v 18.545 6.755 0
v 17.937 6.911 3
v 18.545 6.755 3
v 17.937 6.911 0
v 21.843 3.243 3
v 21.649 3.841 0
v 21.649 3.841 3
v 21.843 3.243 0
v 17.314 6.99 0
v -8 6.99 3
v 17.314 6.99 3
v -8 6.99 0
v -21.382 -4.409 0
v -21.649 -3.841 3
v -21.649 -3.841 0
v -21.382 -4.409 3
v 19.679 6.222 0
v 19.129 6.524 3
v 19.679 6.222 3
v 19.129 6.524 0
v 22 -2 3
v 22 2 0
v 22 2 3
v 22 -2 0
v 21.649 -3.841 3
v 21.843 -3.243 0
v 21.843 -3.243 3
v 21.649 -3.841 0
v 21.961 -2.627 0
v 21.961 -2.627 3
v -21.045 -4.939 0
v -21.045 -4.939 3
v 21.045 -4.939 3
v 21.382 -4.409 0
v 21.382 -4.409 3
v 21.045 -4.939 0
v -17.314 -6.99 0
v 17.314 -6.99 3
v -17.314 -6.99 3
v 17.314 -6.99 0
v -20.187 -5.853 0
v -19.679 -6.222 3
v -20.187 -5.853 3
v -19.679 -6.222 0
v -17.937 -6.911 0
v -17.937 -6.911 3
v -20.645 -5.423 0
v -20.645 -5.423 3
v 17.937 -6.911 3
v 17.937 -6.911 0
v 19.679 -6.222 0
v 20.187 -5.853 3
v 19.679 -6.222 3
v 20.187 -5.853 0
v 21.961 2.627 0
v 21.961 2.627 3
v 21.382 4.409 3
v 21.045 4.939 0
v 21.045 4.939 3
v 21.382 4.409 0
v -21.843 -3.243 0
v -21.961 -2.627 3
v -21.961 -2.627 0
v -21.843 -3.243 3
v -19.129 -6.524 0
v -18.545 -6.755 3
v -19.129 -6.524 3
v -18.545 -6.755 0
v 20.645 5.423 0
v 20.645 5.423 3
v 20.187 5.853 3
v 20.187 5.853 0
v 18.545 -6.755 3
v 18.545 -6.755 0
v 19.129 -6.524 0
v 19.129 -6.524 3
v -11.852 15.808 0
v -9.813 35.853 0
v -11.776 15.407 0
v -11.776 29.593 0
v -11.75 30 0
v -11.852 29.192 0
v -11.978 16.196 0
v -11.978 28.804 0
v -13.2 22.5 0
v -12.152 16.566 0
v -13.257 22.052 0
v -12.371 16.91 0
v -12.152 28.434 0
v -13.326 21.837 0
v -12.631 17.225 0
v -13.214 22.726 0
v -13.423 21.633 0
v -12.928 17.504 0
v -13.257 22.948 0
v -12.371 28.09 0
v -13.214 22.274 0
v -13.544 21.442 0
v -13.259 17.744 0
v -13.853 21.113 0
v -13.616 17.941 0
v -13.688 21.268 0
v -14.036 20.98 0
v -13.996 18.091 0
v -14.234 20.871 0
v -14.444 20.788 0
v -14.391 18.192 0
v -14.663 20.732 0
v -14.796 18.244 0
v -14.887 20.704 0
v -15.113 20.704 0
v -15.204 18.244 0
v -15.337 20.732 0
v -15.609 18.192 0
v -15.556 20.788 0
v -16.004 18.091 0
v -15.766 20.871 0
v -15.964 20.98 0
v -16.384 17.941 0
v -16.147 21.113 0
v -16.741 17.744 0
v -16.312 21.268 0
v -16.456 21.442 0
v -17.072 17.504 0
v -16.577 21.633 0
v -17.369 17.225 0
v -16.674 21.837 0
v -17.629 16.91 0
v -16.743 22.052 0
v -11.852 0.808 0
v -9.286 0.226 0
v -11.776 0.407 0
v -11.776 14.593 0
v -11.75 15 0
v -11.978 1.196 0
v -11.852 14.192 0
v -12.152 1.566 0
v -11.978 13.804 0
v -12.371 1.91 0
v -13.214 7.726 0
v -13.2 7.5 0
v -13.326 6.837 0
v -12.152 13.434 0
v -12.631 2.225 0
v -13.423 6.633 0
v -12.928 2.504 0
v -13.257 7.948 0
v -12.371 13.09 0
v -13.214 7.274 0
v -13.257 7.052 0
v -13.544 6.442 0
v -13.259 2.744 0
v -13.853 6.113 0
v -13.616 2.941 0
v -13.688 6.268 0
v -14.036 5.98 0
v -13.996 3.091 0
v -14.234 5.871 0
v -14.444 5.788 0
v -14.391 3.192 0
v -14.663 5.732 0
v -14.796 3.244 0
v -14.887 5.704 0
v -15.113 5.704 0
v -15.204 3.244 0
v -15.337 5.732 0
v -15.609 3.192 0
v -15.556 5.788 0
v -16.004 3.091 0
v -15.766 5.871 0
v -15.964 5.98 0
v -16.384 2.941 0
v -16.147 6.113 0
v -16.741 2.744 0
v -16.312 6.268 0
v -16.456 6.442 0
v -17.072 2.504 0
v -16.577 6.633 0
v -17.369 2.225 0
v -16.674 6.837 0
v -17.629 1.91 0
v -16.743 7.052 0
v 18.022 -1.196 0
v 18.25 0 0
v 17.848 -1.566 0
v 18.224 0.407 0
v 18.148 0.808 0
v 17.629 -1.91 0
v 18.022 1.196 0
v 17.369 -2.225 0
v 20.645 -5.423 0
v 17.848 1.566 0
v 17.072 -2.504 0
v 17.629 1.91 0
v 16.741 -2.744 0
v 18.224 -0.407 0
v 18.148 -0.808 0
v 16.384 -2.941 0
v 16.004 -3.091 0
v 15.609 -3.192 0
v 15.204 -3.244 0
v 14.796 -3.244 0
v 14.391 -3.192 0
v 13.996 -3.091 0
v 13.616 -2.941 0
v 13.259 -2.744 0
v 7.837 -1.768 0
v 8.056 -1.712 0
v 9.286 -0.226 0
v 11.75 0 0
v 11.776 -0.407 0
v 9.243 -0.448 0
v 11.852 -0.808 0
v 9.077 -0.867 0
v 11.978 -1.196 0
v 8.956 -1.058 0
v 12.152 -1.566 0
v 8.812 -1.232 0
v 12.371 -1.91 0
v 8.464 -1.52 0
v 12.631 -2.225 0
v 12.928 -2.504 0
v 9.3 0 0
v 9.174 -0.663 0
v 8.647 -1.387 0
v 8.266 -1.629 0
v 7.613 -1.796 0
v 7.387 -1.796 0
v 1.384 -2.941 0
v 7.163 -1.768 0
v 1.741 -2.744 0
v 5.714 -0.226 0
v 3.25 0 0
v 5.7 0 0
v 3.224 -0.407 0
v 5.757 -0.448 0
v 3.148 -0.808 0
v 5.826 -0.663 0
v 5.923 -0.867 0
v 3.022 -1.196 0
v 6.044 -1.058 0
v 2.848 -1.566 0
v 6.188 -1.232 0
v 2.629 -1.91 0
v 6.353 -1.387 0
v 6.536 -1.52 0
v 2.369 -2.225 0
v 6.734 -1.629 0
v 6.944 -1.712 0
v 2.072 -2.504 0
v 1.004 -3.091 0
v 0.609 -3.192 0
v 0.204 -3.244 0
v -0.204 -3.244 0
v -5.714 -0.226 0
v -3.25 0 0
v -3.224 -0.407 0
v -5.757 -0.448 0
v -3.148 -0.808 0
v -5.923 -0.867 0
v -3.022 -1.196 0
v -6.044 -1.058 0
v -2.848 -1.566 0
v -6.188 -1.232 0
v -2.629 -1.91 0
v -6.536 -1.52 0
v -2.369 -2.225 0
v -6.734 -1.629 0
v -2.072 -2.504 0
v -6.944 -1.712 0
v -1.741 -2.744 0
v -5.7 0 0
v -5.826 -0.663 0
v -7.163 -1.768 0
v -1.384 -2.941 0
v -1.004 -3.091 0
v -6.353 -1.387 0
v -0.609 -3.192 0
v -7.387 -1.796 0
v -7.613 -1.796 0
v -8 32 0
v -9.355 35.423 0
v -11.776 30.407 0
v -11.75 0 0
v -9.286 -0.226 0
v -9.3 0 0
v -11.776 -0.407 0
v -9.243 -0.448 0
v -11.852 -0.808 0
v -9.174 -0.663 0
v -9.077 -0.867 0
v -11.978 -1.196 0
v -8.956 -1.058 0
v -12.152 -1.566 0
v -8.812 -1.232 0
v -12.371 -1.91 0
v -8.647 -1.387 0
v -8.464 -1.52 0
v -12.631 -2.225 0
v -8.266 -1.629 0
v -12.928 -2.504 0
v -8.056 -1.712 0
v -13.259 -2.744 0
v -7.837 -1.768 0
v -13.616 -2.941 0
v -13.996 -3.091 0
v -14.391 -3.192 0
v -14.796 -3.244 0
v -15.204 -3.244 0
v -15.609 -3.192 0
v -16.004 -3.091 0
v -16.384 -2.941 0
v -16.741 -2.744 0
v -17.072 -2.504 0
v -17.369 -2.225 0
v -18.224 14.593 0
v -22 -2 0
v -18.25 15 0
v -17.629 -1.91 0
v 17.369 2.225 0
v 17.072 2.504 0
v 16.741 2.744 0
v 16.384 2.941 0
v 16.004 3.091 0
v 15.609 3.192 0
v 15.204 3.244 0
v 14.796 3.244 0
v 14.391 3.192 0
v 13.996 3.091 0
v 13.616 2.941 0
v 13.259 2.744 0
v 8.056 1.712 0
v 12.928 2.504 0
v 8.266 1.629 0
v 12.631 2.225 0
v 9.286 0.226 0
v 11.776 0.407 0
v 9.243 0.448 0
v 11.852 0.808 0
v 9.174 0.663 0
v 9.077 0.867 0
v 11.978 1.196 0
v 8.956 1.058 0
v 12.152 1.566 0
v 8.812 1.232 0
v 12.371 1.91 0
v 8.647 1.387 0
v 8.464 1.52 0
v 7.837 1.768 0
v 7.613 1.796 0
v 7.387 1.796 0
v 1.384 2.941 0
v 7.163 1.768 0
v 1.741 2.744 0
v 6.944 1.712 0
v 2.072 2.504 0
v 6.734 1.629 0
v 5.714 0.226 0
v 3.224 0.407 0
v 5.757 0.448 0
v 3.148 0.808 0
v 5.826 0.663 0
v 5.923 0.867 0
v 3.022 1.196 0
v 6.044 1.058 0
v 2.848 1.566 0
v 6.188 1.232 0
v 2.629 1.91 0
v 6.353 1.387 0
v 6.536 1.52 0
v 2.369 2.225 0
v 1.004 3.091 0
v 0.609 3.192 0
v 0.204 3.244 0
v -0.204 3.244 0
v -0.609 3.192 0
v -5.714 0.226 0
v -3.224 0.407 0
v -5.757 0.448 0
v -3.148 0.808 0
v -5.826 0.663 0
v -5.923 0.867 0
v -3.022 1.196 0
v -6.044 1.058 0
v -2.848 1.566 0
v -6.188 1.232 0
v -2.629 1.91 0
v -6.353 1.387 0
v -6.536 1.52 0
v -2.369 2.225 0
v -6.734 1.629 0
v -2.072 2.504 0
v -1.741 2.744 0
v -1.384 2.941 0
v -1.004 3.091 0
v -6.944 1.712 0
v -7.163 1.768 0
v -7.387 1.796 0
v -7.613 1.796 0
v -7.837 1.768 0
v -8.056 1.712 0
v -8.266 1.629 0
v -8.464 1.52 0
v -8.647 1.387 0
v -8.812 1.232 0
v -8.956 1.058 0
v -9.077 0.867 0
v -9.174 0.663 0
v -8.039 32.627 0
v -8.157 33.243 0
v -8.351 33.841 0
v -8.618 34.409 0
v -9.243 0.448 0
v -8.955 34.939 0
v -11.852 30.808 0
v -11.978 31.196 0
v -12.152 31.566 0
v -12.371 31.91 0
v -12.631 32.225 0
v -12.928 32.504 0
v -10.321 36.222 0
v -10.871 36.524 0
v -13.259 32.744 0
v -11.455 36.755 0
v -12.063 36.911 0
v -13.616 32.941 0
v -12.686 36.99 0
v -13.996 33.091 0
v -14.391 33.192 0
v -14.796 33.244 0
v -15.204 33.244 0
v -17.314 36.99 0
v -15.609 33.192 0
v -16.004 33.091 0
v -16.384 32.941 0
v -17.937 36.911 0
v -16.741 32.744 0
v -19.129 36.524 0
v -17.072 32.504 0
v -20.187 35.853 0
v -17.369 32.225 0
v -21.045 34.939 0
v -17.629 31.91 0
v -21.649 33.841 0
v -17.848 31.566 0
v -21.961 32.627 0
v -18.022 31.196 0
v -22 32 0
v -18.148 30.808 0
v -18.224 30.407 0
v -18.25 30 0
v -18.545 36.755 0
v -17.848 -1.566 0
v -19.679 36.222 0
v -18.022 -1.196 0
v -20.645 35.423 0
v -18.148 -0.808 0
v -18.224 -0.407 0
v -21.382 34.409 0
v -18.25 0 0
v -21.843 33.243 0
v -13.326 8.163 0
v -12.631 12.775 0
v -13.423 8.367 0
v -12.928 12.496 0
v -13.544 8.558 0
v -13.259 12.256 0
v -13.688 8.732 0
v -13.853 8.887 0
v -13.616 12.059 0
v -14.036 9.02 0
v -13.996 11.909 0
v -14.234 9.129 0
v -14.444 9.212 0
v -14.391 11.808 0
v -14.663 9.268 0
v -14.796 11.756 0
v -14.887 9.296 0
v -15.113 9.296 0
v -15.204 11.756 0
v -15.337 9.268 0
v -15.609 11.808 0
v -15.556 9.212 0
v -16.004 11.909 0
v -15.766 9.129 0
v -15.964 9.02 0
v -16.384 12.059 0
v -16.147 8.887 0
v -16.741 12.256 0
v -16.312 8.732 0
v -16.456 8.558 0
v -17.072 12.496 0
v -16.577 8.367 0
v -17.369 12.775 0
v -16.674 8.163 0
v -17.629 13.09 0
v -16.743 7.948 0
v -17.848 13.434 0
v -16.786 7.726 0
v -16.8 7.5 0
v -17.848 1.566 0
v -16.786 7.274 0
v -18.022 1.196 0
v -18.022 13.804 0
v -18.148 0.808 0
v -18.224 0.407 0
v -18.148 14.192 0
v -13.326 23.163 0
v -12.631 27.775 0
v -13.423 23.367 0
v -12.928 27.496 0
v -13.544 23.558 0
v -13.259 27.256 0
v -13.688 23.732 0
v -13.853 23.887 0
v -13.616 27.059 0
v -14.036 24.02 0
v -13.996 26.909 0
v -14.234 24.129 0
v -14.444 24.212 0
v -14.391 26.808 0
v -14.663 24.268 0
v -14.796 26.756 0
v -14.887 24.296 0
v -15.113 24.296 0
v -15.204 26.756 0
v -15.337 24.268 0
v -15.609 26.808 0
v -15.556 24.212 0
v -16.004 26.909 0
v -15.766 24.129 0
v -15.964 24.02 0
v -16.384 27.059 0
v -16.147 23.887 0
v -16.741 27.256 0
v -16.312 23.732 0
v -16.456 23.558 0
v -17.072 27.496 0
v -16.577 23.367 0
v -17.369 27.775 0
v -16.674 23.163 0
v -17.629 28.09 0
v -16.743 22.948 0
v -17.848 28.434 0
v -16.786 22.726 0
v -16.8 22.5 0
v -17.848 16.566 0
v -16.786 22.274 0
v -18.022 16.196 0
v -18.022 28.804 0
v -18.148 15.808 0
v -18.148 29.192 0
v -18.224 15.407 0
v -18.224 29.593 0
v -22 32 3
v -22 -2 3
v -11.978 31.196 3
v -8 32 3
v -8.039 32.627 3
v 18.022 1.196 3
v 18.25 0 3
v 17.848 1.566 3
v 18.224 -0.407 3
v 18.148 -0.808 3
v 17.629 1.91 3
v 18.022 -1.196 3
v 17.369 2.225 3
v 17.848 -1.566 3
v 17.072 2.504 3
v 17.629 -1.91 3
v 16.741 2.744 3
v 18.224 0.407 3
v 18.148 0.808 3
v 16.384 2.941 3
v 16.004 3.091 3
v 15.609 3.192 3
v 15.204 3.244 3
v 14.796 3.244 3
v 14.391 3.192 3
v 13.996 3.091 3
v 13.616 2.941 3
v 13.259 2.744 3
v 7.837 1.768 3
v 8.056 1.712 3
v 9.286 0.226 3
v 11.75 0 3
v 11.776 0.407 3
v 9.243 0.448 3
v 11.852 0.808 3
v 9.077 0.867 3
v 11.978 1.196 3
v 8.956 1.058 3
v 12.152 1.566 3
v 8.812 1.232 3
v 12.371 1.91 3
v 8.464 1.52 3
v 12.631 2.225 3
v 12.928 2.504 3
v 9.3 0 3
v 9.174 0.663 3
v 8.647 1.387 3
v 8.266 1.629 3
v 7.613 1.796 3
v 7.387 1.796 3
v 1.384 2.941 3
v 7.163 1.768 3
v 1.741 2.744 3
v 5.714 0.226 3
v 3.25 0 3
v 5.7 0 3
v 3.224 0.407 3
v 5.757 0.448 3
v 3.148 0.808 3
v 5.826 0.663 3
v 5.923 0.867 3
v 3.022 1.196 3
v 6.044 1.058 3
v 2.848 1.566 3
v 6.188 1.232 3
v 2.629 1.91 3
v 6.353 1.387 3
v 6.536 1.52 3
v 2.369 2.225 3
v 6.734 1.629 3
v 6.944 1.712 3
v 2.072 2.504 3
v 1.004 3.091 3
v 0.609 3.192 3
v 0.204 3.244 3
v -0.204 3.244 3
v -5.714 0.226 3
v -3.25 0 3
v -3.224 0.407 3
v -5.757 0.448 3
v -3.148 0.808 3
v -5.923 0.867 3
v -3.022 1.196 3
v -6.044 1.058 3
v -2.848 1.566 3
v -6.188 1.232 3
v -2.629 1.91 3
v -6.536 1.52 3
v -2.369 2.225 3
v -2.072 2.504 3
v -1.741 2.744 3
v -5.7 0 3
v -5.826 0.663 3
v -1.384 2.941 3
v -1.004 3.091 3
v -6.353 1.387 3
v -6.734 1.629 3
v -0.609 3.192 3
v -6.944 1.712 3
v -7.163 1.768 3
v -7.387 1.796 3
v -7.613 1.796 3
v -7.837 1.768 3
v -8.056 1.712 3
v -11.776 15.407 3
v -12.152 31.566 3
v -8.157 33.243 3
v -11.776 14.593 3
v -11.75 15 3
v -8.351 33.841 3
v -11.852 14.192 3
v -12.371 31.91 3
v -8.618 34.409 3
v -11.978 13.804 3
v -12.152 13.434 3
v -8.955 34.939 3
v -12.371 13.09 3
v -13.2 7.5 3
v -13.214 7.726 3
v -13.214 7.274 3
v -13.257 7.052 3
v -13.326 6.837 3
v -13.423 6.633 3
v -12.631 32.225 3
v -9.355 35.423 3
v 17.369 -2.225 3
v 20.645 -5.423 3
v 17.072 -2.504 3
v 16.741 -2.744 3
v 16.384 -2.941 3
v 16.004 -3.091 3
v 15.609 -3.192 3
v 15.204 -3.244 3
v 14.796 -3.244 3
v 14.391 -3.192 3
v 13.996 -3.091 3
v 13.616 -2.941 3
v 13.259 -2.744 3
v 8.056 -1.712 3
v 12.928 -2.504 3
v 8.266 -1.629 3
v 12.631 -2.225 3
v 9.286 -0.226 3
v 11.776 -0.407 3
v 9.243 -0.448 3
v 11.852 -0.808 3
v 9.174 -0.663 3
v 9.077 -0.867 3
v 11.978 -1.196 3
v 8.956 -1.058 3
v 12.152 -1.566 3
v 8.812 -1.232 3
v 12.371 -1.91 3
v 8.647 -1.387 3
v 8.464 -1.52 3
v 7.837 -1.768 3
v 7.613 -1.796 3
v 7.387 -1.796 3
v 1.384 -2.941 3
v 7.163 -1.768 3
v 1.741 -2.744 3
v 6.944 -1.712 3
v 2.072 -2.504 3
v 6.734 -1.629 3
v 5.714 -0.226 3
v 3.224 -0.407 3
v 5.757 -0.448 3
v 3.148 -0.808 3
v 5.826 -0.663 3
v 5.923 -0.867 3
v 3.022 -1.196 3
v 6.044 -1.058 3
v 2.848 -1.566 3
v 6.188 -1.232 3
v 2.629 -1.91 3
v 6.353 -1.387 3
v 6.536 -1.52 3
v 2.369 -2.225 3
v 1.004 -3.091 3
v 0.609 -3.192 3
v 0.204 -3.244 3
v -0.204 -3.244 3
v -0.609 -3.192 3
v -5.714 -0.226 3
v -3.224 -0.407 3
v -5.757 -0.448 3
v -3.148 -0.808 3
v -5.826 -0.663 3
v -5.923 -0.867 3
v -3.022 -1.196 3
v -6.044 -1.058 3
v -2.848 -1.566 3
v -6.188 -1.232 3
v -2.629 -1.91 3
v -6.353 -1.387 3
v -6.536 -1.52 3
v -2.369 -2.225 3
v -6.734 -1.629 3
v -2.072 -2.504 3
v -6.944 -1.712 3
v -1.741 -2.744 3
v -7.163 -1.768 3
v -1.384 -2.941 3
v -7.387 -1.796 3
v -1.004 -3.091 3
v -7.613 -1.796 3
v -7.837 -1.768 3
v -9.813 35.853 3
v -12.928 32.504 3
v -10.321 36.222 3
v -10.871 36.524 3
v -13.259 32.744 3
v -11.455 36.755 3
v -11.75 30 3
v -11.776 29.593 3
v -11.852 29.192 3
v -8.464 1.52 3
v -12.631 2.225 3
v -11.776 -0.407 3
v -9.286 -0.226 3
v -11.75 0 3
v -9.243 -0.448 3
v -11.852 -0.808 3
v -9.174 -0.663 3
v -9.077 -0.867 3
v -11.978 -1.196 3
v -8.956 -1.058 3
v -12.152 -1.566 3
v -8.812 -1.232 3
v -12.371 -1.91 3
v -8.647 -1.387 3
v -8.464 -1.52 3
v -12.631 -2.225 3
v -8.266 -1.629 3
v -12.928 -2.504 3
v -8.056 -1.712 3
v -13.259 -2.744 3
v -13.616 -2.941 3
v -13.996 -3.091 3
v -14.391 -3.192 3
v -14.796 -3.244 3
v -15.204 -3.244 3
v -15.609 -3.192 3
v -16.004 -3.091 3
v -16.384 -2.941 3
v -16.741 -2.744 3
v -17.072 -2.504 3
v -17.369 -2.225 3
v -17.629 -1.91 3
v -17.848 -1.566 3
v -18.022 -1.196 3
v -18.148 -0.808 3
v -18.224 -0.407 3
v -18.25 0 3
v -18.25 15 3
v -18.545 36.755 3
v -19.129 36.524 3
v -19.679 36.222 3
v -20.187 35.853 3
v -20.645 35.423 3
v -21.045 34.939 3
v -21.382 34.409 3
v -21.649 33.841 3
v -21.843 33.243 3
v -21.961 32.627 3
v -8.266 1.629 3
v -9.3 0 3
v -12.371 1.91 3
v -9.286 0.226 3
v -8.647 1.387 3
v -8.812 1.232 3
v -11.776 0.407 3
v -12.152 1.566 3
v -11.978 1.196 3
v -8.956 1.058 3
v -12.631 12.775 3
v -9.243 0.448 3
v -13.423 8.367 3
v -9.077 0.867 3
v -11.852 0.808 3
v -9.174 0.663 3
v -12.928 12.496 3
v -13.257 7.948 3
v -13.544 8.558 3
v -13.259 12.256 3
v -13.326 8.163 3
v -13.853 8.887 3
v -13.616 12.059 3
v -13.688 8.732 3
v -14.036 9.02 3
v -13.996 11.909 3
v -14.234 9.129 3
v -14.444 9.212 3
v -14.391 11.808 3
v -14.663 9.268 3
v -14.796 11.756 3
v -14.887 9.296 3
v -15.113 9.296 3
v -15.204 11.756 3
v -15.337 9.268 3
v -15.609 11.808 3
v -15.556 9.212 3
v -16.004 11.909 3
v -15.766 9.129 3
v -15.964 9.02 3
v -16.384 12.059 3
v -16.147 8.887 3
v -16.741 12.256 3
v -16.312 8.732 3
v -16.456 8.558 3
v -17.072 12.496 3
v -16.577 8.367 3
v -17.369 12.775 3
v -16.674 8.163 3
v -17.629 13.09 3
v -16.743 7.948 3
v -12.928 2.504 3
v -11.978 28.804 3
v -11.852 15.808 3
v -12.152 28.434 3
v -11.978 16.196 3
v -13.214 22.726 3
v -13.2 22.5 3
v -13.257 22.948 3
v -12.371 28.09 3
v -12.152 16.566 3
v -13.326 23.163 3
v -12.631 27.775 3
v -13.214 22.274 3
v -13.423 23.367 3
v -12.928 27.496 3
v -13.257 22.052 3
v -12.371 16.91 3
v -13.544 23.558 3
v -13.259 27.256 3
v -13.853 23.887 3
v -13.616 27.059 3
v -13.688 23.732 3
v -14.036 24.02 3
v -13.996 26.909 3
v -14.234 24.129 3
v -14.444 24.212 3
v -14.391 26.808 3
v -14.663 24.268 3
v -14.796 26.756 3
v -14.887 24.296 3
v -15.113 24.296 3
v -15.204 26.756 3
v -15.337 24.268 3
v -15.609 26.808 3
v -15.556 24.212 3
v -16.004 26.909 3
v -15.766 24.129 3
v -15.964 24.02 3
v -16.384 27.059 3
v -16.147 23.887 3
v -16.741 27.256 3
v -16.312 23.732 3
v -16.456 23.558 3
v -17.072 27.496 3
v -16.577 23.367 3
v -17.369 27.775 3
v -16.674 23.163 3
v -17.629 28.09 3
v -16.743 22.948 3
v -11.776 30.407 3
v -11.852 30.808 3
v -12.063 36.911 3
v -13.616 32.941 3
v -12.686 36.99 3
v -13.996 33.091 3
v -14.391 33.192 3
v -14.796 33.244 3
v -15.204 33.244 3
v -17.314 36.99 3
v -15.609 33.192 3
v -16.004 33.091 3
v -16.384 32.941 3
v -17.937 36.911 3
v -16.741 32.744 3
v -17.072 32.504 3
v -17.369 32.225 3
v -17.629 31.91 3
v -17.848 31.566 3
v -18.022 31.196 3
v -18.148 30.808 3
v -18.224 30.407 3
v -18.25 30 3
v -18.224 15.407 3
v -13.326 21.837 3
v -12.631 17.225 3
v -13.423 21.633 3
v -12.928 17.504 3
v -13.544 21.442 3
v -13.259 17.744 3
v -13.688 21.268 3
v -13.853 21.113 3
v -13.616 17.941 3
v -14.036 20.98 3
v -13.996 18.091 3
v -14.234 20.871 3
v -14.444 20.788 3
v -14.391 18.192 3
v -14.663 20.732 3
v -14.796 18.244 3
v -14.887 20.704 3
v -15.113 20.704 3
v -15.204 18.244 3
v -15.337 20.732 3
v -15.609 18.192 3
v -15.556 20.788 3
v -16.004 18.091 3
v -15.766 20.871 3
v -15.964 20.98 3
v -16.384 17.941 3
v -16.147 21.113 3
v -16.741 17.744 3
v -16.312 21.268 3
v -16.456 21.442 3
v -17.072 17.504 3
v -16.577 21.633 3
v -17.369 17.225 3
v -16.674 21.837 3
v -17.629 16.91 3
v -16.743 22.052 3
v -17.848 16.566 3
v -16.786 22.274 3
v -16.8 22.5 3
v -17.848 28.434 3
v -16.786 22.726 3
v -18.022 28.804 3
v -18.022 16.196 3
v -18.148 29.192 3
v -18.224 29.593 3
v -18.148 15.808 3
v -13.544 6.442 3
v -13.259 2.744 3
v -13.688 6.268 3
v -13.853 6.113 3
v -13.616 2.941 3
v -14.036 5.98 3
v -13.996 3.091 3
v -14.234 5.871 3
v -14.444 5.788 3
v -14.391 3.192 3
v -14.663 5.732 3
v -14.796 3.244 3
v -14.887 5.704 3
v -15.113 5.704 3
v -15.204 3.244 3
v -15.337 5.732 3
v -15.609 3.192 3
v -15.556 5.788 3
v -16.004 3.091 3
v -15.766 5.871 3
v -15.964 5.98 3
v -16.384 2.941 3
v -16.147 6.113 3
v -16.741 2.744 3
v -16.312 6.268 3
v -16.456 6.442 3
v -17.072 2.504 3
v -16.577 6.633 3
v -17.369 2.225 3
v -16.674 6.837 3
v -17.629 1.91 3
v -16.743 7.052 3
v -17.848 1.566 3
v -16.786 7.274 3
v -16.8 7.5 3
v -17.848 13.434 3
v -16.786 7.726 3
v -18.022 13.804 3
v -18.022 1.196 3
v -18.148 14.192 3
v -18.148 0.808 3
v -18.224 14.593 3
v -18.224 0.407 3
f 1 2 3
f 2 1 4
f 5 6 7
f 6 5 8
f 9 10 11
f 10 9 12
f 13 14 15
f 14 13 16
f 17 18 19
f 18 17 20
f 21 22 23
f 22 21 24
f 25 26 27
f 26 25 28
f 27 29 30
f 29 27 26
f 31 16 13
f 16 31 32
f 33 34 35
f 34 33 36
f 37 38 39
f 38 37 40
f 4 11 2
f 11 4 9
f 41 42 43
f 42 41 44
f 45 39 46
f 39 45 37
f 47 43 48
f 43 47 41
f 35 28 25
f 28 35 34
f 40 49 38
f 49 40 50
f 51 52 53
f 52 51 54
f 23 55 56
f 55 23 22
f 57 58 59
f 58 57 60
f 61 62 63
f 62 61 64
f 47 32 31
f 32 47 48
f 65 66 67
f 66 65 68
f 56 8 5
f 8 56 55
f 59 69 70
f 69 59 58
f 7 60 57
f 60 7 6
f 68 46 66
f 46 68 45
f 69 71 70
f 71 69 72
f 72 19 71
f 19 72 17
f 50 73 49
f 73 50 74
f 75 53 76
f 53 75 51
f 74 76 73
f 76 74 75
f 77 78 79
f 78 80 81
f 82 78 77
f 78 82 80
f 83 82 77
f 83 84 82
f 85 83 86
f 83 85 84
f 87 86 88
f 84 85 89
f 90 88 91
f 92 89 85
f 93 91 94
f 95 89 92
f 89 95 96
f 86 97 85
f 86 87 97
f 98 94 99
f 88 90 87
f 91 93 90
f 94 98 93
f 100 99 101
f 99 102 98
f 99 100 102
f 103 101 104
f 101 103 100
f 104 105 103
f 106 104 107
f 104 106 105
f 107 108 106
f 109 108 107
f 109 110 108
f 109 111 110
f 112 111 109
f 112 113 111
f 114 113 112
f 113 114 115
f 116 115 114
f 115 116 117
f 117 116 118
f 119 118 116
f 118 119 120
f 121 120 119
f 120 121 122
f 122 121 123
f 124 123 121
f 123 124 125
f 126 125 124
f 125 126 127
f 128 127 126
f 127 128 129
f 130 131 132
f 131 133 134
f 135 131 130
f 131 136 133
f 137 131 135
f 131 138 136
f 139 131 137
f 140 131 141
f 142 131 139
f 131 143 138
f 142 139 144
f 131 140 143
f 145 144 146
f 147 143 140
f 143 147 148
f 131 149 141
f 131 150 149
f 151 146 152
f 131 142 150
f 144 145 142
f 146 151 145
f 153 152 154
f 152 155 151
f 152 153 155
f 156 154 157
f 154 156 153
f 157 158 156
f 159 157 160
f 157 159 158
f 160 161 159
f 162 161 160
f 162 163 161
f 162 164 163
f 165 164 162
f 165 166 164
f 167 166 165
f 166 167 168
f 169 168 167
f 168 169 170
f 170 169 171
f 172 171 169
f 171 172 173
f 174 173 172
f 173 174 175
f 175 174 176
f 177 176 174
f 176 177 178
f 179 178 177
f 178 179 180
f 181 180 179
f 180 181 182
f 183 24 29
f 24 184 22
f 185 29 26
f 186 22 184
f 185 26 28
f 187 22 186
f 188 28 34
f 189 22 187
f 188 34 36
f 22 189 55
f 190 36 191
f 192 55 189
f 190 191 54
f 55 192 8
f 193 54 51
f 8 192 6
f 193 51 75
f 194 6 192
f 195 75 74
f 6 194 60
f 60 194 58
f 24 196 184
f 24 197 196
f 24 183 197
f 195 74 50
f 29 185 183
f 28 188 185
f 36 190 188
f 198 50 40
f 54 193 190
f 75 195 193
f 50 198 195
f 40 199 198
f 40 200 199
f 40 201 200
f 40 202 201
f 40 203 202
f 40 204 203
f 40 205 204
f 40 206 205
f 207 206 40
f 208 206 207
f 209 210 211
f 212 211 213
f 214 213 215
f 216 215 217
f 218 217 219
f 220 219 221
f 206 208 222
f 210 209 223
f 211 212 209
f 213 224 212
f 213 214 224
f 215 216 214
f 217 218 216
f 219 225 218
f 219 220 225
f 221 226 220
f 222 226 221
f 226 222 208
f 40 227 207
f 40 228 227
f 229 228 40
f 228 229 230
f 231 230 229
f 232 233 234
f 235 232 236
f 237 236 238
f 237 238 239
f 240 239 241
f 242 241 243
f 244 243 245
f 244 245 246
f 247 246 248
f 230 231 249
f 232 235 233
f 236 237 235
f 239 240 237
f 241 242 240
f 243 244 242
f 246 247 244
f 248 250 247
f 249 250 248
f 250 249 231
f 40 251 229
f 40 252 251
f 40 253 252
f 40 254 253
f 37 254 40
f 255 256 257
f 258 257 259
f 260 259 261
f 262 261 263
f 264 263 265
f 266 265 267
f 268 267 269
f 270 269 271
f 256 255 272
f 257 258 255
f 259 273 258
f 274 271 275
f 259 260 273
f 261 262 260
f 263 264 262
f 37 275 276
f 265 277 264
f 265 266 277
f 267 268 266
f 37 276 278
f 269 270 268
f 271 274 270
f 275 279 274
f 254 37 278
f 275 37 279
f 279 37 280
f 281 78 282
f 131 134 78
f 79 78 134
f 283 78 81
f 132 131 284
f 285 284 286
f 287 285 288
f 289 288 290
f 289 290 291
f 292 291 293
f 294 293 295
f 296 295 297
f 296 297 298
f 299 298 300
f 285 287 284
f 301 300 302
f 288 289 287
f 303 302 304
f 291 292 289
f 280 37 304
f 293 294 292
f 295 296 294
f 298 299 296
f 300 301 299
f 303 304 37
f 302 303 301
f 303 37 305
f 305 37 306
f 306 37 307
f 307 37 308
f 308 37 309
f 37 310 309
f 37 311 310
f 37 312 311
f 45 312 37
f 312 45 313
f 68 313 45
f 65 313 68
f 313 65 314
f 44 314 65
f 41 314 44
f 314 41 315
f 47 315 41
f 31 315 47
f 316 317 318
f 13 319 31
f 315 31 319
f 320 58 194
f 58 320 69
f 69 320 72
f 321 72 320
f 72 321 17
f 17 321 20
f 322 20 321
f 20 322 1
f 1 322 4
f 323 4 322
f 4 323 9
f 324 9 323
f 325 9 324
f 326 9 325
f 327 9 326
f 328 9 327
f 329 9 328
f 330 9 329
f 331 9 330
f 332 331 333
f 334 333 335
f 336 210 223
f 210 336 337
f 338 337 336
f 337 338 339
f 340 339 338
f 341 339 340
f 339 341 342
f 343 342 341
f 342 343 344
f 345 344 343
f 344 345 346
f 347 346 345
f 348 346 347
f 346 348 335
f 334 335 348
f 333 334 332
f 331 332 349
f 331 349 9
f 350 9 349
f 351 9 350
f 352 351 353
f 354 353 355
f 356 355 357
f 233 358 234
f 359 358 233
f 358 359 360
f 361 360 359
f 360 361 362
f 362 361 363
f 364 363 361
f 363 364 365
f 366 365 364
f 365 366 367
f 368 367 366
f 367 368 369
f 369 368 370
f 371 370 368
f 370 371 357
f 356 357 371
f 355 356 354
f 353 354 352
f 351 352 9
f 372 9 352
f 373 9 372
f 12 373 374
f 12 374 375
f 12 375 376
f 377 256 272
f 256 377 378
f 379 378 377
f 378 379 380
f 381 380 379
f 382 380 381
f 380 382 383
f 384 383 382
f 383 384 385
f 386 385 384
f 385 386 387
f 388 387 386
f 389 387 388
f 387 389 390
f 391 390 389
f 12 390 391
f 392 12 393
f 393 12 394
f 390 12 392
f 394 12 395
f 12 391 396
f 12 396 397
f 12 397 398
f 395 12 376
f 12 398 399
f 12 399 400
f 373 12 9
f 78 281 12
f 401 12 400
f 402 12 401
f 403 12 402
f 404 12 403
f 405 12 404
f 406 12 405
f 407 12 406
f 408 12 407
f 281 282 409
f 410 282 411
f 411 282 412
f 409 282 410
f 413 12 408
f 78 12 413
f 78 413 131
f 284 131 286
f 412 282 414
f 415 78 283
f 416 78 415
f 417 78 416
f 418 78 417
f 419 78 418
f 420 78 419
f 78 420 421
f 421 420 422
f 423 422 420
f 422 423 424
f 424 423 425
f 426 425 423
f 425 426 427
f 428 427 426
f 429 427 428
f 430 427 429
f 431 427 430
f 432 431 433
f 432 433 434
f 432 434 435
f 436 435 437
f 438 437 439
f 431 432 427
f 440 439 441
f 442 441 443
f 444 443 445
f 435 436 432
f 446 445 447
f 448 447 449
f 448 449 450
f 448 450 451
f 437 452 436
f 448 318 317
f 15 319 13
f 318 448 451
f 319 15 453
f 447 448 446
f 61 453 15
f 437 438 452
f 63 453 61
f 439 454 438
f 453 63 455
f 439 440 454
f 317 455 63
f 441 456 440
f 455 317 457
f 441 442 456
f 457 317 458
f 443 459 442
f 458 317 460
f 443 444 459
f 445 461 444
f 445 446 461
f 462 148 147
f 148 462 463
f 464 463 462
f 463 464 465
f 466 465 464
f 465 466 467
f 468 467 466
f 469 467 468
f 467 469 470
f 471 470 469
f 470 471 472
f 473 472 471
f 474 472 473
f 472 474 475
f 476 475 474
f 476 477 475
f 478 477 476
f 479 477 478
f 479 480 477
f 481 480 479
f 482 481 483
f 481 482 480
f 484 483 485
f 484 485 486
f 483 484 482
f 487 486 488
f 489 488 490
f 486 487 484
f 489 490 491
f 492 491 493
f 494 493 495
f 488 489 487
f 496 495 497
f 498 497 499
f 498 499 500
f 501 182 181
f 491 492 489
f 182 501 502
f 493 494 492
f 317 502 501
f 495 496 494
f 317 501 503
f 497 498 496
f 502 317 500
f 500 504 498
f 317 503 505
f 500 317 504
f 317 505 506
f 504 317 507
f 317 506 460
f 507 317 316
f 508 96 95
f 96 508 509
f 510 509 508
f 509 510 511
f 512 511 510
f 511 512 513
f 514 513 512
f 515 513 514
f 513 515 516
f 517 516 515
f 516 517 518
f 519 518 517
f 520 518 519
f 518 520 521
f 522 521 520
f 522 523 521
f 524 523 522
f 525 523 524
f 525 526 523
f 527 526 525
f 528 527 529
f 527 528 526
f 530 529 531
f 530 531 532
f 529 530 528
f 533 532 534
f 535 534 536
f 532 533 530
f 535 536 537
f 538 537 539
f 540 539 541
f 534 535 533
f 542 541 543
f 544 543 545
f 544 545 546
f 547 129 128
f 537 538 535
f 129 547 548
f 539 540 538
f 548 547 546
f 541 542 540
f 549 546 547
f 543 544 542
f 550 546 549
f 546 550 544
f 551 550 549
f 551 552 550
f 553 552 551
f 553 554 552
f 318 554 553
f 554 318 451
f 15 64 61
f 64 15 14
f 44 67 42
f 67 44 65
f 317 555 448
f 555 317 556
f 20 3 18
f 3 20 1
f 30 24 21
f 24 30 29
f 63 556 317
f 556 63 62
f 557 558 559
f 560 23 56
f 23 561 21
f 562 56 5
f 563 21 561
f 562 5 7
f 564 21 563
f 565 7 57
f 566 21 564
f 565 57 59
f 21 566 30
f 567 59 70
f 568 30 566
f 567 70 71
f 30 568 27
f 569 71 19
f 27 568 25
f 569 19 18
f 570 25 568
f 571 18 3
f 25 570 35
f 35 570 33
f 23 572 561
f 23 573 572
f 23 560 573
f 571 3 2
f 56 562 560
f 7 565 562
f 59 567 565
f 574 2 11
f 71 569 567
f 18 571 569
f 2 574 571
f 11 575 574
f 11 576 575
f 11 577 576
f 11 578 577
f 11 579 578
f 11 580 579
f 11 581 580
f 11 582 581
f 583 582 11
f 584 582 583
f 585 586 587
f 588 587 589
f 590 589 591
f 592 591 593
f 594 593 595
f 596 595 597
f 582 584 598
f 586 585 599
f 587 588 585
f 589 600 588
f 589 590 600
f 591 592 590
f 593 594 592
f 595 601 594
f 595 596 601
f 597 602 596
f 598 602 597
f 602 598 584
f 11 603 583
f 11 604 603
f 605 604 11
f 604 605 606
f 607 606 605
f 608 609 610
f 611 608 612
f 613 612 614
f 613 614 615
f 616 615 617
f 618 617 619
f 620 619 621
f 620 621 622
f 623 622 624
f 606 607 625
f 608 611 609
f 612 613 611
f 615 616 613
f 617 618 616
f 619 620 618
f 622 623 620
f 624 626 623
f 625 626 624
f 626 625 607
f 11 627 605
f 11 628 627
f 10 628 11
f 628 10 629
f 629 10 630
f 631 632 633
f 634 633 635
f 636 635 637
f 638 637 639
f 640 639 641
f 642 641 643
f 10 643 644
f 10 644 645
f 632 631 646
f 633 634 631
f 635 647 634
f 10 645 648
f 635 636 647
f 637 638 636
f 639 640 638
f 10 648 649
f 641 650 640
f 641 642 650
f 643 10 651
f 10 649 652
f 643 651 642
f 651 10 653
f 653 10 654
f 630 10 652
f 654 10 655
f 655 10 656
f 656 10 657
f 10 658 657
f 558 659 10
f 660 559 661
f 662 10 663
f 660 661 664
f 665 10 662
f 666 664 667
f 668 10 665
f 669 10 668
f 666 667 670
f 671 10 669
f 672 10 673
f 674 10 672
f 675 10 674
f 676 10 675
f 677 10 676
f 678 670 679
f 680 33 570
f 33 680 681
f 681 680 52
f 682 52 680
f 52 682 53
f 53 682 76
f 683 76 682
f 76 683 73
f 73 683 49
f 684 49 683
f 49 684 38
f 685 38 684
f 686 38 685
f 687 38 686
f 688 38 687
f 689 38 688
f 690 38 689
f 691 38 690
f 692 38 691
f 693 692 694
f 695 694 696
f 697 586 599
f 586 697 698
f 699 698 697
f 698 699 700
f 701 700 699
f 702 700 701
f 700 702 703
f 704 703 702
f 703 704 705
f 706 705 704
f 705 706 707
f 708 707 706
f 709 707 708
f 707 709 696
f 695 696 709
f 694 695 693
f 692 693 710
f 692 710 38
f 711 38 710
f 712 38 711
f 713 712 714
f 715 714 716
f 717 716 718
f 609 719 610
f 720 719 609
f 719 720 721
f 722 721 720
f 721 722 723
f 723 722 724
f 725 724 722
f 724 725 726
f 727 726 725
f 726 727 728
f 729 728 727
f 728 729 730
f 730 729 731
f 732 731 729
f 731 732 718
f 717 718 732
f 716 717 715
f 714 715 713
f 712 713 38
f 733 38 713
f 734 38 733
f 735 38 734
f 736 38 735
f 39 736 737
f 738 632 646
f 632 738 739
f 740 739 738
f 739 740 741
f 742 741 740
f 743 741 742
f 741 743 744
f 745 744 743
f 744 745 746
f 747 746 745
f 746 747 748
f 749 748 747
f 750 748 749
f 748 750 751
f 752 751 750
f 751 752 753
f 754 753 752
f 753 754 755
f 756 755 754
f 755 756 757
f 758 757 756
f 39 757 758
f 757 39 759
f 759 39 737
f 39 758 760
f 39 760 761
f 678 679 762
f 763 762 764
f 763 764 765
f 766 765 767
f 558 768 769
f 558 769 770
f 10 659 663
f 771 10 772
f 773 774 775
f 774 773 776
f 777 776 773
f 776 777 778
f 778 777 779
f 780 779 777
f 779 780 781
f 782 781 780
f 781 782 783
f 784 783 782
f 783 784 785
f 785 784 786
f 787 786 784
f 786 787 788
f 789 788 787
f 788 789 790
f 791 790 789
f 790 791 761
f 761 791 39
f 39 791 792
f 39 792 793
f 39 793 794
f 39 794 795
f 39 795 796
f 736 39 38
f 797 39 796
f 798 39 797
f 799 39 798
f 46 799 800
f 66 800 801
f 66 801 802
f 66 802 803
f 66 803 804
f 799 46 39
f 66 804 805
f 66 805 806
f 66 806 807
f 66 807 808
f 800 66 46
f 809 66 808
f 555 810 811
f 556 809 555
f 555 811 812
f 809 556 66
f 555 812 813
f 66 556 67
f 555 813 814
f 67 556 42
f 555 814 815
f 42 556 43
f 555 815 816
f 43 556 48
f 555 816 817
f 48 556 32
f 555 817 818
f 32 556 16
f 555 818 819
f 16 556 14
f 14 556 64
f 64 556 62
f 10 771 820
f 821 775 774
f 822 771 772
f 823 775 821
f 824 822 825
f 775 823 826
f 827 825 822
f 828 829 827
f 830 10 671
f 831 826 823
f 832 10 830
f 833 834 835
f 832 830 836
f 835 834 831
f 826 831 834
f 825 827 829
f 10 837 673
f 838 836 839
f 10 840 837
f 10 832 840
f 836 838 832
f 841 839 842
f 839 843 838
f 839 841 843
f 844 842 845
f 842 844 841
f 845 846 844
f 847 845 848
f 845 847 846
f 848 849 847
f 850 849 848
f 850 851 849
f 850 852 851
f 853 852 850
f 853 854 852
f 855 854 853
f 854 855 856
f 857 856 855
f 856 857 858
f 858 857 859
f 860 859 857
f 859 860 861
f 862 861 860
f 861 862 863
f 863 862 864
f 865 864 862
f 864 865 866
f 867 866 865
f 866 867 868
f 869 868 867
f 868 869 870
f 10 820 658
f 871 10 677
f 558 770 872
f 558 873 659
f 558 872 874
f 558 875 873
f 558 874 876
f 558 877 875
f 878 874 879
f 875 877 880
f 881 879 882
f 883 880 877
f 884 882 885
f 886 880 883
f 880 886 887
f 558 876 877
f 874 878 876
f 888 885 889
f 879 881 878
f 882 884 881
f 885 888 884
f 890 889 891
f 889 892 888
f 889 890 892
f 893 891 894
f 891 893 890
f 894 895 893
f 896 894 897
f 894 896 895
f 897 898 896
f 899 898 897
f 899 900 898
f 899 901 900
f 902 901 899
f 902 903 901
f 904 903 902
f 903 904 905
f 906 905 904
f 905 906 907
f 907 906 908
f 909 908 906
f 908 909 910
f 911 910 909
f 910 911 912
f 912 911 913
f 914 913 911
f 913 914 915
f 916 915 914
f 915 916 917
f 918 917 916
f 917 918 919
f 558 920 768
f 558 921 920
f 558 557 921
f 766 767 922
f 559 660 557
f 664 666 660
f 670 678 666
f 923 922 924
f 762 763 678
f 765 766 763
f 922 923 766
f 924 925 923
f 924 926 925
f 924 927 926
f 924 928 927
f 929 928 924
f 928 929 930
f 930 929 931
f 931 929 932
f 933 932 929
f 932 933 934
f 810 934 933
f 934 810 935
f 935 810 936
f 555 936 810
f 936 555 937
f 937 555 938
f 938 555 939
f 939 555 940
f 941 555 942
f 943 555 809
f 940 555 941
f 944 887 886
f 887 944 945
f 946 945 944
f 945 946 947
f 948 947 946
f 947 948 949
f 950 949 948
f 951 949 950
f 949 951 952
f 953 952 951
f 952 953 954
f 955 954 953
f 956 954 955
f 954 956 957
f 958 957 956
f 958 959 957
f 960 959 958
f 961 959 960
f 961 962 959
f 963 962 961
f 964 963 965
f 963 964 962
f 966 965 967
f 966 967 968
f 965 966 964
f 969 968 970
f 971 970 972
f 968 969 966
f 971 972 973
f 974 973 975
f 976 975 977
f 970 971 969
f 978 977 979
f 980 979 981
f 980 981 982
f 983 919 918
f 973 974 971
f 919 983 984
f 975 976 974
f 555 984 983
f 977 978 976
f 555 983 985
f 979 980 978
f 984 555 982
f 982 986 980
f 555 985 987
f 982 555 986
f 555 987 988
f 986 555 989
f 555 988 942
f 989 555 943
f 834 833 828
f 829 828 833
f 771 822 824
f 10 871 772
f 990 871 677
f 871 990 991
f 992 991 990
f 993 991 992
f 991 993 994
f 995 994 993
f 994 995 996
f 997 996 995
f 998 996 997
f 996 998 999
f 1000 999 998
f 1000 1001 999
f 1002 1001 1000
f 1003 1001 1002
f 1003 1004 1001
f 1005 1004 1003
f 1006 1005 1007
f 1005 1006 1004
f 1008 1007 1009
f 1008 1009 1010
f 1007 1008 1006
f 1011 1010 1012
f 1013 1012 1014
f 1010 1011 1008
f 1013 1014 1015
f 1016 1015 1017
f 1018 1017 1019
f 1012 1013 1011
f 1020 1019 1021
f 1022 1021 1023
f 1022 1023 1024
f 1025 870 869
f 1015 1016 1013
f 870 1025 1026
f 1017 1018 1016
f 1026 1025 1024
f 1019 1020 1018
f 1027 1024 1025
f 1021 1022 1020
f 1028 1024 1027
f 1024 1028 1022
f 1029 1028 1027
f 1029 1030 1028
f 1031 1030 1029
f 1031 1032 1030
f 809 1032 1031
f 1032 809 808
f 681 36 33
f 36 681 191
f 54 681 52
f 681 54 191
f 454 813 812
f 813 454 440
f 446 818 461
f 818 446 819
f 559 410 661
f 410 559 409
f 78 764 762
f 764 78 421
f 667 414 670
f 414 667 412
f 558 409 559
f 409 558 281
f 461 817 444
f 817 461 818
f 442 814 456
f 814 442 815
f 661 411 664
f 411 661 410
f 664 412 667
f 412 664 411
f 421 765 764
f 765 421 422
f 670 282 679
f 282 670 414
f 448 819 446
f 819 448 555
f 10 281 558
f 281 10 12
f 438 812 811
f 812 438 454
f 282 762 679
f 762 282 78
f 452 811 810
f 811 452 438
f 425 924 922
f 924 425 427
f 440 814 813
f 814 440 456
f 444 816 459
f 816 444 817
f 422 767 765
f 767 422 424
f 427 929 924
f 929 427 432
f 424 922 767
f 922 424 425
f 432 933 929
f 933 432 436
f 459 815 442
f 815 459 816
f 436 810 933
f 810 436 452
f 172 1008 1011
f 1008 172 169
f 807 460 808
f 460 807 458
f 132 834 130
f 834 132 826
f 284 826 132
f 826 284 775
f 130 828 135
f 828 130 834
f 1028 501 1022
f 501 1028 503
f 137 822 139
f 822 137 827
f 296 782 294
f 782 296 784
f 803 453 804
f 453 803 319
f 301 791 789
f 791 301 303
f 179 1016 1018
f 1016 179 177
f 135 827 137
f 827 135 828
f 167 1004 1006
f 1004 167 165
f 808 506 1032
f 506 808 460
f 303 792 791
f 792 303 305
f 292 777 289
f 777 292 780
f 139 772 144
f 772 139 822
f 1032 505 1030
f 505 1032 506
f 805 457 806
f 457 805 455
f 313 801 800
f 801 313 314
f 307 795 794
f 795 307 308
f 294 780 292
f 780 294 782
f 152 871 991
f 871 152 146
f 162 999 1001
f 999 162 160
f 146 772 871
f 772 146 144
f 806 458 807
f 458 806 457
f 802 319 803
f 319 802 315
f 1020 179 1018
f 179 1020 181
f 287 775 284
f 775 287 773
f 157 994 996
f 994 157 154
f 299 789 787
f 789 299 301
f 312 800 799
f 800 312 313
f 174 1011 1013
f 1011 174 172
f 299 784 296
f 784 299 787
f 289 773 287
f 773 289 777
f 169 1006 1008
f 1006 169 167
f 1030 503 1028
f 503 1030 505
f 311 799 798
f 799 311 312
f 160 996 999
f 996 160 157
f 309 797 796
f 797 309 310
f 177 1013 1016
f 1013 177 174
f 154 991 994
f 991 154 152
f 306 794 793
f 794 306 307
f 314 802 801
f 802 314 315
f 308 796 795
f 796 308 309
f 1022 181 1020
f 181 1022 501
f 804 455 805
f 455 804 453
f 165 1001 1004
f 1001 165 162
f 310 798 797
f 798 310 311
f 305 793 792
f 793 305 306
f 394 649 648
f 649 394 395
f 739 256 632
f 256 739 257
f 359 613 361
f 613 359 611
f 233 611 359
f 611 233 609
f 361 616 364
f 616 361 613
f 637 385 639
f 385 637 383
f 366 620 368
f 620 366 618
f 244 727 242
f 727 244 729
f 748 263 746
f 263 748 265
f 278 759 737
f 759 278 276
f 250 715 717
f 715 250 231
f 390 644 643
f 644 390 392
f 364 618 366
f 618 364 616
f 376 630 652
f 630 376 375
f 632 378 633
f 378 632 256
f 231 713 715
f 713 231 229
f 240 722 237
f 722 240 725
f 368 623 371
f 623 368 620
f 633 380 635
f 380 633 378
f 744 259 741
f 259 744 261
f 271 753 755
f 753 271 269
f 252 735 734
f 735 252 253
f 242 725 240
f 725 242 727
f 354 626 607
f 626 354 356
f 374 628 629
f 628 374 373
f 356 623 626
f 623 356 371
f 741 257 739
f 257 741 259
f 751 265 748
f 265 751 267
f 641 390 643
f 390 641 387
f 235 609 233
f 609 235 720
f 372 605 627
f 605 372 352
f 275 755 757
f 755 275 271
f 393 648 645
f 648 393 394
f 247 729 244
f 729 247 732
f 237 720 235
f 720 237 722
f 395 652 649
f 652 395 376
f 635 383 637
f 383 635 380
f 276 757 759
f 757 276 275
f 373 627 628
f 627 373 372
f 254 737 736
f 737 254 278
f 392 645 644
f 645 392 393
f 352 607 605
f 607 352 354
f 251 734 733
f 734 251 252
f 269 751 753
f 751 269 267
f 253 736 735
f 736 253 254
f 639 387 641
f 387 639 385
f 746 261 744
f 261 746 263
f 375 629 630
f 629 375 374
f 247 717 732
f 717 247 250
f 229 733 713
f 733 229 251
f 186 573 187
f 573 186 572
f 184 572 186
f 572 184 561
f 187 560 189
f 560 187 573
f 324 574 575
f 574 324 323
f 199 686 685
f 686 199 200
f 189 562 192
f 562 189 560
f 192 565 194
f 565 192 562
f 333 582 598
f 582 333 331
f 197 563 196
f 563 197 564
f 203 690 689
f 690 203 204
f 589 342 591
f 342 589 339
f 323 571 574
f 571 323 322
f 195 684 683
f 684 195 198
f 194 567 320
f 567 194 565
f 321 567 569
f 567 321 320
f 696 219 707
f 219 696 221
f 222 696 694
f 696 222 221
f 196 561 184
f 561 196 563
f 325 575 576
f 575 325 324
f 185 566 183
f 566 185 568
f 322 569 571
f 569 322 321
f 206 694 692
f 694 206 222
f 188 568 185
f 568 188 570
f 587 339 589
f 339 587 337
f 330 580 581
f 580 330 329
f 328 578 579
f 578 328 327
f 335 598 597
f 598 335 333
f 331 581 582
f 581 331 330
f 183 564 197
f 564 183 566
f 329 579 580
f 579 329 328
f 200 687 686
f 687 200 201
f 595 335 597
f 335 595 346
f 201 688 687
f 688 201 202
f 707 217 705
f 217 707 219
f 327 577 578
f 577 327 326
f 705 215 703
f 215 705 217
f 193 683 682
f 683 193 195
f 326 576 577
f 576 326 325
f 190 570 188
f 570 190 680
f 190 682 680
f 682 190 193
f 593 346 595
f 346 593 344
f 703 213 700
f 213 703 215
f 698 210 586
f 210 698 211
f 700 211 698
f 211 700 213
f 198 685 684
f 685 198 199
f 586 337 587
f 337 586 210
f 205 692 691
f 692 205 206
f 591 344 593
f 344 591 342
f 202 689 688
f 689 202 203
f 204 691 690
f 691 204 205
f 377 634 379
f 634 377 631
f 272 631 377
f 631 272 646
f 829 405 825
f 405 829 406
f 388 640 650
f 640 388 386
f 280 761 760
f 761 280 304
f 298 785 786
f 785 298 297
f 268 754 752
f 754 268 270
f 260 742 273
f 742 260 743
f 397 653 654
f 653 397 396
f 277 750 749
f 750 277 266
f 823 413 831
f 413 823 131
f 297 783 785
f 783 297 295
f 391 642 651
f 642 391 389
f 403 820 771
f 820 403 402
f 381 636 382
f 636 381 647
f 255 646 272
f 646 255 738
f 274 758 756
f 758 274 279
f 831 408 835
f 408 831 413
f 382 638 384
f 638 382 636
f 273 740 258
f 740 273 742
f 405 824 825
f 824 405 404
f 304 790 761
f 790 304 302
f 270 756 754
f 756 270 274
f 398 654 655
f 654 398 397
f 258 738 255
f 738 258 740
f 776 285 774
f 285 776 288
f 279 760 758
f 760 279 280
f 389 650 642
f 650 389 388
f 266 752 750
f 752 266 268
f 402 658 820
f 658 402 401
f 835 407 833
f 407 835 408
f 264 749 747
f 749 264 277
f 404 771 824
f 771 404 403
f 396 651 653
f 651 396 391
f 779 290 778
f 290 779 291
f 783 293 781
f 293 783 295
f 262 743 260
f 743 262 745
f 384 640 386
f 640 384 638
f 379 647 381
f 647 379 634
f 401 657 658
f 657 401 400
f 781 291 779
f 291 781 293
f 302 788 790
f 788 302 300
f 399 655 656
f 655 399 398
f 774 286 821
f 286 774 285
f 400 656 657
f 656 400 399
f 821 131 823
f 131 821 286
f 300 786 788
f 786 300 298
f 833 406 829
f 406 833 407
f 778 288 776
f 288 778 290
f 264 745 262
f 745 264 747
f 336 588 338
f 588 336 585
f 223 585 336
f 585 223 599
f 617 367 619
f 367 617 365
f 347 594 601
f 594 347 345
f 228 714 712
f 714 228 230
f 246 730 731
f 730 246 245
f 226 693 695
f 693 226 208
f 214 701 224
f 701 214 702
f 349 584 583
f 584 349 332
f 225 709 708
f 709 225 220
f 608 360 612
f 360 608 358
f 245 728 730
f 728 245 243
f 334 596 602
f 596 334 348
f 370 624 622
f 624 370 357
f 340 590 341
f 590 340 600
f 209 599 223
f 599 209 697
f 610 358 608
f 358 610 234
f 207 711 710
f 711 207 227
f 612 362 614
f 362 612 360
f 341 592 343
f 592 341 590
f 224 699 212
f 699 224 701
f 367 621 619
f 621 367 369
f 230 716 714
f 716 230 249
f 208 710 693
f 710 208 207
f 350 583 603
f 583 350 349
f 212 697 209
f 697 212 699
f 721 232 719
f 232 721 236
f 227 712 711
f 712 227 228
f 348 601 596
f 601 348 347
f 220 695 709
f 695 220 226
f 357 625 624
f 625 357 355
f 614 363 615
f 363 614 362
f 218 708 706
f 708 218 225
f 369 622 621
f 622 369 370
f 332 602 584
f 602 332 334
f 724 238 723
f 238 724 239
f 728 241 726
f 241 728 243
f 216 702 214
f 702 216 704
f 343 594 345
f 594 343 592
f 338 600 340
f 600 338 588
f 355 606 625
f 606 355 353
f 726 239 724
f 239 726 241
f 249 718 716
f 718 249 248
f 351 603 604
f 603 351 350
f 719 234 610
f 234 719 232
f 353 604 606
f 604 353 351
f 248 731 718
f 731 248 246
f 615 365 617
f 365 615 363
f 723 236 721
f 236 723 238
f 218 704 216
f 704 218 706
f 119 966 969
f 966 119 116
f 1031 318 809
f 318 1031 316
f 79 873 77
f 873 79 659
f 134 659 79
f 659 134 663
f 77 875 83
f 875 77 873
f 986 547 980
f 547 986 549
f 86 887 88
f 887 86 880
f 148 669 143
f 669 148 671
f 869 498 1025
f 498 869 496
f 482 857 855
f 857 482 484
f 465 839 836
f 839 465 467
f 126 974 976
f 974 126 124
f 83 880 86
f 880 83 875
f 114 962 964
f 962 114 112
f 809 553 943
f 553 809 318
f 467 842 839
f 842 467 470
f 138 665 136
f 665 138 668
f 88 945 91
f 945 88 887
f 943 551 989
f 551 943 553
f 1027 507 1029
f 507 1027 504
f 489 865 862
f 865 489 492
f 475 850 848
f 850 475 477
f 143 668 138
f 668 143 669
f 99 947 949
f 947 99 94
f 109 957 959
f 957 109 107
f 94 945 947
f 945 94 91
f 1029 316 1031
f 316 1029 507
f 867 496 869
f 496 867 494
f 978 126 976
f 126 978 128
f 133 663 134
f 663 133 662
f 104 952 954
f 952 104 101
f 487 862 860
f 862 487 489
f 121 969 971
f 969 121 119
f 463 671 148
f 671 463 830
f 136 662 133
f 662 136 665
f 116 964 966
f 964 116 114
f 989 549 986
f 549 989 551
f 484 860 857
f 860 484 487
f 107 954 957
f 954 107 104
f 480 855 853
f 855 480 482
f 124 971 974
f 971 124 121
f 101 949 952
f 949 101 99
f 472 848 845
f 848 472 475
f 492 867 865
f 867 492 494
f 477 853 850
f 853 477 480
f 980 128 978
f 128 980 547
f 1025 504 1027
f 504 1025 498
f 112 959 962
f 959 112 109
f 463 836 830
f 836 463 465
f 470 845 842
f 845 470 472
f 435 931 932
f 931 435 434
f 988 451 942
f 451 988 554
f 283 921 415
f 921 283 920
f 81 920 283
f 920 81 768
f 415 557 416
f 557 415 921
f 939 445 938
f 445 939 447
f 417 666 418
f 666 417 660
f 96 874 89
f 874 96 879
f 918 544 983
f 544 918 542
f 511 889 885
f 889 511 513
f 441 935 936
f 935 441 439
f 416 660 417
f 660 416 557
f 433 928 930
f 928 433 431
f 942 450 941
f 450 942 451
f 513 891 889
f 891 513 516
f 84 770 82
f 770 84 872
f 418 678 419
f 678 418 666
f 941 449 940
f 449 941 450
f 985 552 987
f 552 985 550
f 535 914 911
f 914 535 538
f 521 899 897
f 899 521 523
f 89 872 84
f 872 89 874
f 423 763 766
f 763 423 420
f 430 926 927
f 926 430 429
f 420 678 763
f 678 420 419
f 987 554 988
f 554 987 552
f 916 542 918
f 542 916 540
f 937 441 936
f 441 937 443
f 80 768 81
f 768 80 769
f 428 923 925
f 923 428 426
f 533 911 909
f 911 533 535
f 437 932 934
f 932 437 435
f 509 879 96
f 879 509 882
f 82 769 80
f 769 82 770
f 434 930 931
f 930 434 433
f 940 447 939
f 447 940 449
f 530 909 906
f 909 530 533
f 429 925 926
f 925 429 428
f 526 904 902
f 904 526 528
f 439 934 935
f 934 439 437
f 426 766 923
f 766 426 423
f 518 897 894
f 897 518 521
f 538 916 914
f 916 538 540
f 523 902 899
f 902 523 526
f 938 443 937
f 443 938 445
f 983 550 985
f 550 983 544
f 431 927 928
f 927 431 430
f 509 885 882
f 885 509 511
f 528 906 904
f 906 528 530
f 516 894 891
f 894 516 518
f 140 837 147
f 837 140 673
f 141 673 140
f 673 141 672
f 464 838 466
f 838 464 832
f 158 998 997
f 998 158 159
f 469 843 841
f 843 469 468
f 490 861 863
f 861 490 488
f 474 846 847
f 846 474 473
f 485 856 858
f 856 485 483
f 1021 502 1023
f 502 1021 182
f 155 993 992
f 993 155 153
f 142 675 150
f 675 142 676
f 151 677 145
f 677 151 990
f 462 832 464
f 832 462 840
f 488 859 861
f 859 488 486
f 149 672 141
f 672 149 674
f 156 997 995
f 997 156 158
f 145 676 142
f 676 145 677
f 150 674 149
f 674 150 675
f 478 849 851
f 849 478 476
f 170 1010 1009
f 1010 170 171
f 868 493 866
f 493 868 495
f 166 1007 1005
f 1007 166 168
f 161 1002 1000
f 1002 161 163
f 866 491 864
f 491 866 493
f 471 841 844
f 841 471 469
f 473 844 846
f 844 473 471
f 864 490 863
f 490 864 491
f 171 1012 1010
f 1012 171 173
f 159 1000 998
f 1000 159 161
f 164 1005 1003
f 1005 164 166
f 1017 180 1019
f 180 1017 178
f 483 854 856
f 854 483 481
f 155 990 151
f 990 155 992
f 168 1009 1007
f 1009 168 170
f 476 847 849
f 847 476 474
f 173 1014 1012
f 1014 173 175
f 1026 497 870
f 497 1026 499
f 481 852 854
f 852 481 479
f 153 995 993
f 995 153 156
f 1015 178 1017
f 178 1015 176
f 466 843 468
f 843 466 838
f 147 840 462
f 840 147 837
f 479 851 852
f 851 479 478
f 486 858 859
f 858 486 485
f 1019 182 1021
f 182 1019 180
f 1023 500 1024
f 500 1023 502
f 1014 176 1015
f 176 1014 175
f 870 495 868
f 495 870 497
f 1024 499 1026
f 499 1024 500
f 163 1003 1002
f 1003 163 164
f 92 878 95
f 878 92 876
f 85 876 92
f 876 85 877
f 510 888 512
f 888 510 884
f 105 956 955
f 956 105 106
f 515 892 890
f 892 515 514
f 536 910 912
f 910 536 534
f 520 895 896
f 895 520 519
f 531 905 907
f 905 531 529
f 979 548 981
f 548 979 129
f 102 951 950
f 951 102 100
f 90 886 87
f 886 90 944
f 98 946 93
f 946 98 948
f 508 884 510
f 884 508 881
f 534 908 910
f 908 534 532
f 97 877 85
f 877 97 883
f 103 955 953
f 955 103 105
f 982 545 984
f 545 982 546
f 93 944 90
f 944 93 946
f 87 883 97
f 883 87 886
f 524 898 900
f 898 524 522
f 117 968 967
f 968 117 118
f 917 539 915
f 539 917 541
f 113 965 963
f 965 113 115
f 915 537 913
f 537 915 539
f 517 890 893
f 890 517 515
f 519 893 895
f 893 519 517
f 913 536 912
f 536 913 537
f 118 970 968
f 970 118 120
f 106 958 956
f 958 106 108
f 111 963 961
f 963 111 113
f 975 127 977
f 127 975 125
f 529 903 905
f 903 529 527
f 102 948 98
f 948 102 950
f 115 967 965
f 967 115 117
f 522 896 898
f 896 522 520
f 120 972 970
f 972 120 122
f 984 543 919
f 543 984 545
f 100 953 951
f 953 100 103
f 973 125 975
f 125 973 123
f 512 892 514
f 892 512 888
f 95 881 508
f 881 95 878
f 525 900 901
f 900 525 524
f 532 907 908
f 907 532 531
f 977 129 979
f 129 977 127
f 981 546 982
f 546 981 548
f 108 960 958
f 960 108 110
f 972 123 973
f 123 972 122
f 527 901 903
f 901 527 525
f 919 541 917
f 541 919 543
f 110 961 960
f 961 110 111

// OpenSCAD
$fn = 50;


difference() {
	union() {
		*color(alpha = 1.0000000000, c = "gray") {
			translate(v = [0, 7, 0]) {
				linear_extrude(height = 1) {
					text(font = "Arial:style=Bold", halign = "center", size = 4.5000000000, text = "COMMENT plate main", valign = "center");
				}
			}
		}
		*color(alpha = 1.0000000000, c = "gray") {
			translate(v = [0, 14, 0]) {
				linear_extrude(height = 1) {
					text(font = "Arial:style=Bold", halign = "center", size = 4.5000000000, text = "COMMENT description oobb_plate_shape_p_type_3_depth_3_width_1_height_3_thickness_false_full_object", valign = "center");
				}
			}
		}
		hull() {
			translate(v = [-17.0000000000, 2.0000000000, 0]) {
				cylinder(h = 3, r = 5);
			}
			translate(v = [17.0000000000, 2.0000000000, 0]) {
				cylinder(h = 3, r = 5);
			}
			translate(v = [-17.0000000000, -2.0000000000, 0]) {
				cylinder(h = 3, r = 5);
			}
			translate(v = [17.0000000000, -2.0000000000, 0]) {
				cylinder(h = 3, r = 5);
			}
		}
		*color(alpha = 1.0000000000, c = "gray") {
			translate(v = [0, 7, 0]) {
				linear_extrude(height = 1) {
					text(font = "Arial:style=Bold", halign = "center", size = 4.5000000000, text = "COMMENT plate main", valign = "center");
				}
			}
		}
		*color(alpha = 1.0000000000, c = "gray") {
			translate(v = [-15.0000000000, 29.0000000000, 0]) {
				linear_extrude(height = 3) {
					text(font = "Arial:style=Bold", halign = "center", size = 4.5000000000, text = "COMMENT description oobb_plate_shape_p_type_3_depth_-15.0_15.0_0_pos_1_width_3_height_3_thickness_false_full_object", valign = "center");
				}
			}
		}
		translate(v = [-15.0000000000, 15.0000000000, 0]) {
			hull() {
				translate(v = [-2.0000000000, 17.0000000000, 0]) {
					cylinder(h = 3, r = 5);
				}
				translate(v = [2.0000000000, 17.0000000000, 0]) {
					cylinder(h = 3, r = 5);
				}
				translate(v = [-2.0000000000, -17.0000000000, 0]) {
					cylinder(h = 3, r = 5);
				}
				translate(v = [2.0000000000, -17.0000000000, 0]) {
					cylinder(h = 3, r = 5);
				}
			}
		}
	}
	union() {
		*color(alpha = 1.0000000000, c = "gray") {
			translate(v = [0, 7, 0]) {
				linear_extrude(height = 1) {
					text(font = "Arial:style=Bold", halign = "center", size = 4.5000000000, text = "COMMENT holes main", valign = "center");
				}
			}
		}
		*color(alpha = 1.0000000000, c = "gray") {
			translate(v = [0, 14, 0]) {
				linear_extrude(height = 1) {
					text(font = "Arial:style=Bold", halign = "center", size = 4.5000000000, text = "COMMENT description oobb_holes_shape_n_type_3_width_1_height_3_thickness_false_full_object_true_both_holes", valign = "center");
				}
			}
		}
		translate(v = [-15.0000000000, 0.0000000000, 0]) {
			translate(v = [0, 0, -50]) {
				cylinder(h = 100, r = 3.2500000000);
			}
		}
		translate(v = [0, 0, -50]) {
			cylinder(h = 100, r = 3.2500000000);
		}
		translate(v = [15.0000000000, 0.0000000000, 0]) {
			translate(v = [0, 0, -50]) {
				cylinder(h = 100, r = 3.2500000000);
			}
		}
		translate(v = [-15.0000000000, 0.0000000000, 0]) {
			translate(v = [0, 0, -50]) {
				cylinder(h = 100, r = 1.8000000000);
			}
		}
		translate(v = [-7.5000000000, 0.0000000000, 0]) {
			translate(v = [0, 0, -50]) {
				cylinder(h = 100, r = 1.8000000000);
			}
		}
		translate(v = [0, 0, -50]) {
			cylinder(h = 100, r = 1.8000000000);
		}
		translate(v = [7.5000000000, 0.0000000000, 0]) {
			translate(v = [0, 0, -50]) {
				cylinder(h = 100, r = 1.8000000000);
			}
		}
		translate(v = [15.0000000000, 0.0000000000, 0]) {
			translate(v = [0, 0, -50]) {
				cylinder(h = 100, r = 1.8000000000);
			}
		}
		*color(alpha = 1.0000000000, c = "gray") {
			translate(v = [0, 7, 0]) {
				linear_extrude(height = 1) {
					text(font = "Arial:style=Bold", halign = "center", size = 4.5000000000, text = "COMMENT holes main", valign = "center");
				}
			}
		}
		*color(alpha = 1.0000000000, c = "gray") {
			translate(v = [-15.0000000000, 29.0000000000, 0]) {
				linear_extrude(height = 3) {
					text(font = "Arial:style=Bold", halign = "center", size = 4.5000000000, text = "COMMENT description oobb_holes_shape_n_type_-15.0_15.0_0_pos_1_width_3_height_3_thickness_false_full_object_true_both_holes", valign = "center");
				}
			}
		}
		translate(v = [-15.0000000000, 0.0000000000, 0]) {
			translate(v = [0, 0, -50]) {
				cylinder(h = 100, r = 3.2500000000);
			}
		}
		translate(v = [-15.0000000000, 15.0000000000, 0]) {
			translate(v = [0, 0, -50]) {
				cylinder(h = 100, r = 3.2500000000);
			}
		}
		translate(v = [-15.0000000000, 30.0000000000, 0]) {
			translate(v = [0, 0, -50]) {
				cylinder(h = 100, r = 3.2500000000);
			}
		}
		translate(v = [-15.0000000000, 0.0000000000, 0]) {
			translate(v = [0, 0, -50]) {
				cylinder(h = 100, r = 1.8000000000);
			}
		}
		translate(v = [-15.0000000000, 7.5000000000, 0]) {
			translate(v = [0, 0, -50]) {
				cylinder(h = 100, r = 1.8000000000);
			}
		}
		translate(v = [-15.0000000000, 15.0000000000, 0]) {
			translate(v = [0, 0, -50]) {
				cylinder(h = 100, r = 1.8000000000);
			}
		}
		translate(v = [-15.0000000000, 22.5000000000, 0]) {
			translate(v = [0, 0, -50]) {
				cylinder(h = 100, r = 1.8000000000);
			}
		}
		translate(v = [-15.0000000000, 30.0000000000, 0]) {
			translate(v = [0, 0, -50]) {
				cylinder(h = 100, r = 1.8000000000);
			}
		}
	}
}
